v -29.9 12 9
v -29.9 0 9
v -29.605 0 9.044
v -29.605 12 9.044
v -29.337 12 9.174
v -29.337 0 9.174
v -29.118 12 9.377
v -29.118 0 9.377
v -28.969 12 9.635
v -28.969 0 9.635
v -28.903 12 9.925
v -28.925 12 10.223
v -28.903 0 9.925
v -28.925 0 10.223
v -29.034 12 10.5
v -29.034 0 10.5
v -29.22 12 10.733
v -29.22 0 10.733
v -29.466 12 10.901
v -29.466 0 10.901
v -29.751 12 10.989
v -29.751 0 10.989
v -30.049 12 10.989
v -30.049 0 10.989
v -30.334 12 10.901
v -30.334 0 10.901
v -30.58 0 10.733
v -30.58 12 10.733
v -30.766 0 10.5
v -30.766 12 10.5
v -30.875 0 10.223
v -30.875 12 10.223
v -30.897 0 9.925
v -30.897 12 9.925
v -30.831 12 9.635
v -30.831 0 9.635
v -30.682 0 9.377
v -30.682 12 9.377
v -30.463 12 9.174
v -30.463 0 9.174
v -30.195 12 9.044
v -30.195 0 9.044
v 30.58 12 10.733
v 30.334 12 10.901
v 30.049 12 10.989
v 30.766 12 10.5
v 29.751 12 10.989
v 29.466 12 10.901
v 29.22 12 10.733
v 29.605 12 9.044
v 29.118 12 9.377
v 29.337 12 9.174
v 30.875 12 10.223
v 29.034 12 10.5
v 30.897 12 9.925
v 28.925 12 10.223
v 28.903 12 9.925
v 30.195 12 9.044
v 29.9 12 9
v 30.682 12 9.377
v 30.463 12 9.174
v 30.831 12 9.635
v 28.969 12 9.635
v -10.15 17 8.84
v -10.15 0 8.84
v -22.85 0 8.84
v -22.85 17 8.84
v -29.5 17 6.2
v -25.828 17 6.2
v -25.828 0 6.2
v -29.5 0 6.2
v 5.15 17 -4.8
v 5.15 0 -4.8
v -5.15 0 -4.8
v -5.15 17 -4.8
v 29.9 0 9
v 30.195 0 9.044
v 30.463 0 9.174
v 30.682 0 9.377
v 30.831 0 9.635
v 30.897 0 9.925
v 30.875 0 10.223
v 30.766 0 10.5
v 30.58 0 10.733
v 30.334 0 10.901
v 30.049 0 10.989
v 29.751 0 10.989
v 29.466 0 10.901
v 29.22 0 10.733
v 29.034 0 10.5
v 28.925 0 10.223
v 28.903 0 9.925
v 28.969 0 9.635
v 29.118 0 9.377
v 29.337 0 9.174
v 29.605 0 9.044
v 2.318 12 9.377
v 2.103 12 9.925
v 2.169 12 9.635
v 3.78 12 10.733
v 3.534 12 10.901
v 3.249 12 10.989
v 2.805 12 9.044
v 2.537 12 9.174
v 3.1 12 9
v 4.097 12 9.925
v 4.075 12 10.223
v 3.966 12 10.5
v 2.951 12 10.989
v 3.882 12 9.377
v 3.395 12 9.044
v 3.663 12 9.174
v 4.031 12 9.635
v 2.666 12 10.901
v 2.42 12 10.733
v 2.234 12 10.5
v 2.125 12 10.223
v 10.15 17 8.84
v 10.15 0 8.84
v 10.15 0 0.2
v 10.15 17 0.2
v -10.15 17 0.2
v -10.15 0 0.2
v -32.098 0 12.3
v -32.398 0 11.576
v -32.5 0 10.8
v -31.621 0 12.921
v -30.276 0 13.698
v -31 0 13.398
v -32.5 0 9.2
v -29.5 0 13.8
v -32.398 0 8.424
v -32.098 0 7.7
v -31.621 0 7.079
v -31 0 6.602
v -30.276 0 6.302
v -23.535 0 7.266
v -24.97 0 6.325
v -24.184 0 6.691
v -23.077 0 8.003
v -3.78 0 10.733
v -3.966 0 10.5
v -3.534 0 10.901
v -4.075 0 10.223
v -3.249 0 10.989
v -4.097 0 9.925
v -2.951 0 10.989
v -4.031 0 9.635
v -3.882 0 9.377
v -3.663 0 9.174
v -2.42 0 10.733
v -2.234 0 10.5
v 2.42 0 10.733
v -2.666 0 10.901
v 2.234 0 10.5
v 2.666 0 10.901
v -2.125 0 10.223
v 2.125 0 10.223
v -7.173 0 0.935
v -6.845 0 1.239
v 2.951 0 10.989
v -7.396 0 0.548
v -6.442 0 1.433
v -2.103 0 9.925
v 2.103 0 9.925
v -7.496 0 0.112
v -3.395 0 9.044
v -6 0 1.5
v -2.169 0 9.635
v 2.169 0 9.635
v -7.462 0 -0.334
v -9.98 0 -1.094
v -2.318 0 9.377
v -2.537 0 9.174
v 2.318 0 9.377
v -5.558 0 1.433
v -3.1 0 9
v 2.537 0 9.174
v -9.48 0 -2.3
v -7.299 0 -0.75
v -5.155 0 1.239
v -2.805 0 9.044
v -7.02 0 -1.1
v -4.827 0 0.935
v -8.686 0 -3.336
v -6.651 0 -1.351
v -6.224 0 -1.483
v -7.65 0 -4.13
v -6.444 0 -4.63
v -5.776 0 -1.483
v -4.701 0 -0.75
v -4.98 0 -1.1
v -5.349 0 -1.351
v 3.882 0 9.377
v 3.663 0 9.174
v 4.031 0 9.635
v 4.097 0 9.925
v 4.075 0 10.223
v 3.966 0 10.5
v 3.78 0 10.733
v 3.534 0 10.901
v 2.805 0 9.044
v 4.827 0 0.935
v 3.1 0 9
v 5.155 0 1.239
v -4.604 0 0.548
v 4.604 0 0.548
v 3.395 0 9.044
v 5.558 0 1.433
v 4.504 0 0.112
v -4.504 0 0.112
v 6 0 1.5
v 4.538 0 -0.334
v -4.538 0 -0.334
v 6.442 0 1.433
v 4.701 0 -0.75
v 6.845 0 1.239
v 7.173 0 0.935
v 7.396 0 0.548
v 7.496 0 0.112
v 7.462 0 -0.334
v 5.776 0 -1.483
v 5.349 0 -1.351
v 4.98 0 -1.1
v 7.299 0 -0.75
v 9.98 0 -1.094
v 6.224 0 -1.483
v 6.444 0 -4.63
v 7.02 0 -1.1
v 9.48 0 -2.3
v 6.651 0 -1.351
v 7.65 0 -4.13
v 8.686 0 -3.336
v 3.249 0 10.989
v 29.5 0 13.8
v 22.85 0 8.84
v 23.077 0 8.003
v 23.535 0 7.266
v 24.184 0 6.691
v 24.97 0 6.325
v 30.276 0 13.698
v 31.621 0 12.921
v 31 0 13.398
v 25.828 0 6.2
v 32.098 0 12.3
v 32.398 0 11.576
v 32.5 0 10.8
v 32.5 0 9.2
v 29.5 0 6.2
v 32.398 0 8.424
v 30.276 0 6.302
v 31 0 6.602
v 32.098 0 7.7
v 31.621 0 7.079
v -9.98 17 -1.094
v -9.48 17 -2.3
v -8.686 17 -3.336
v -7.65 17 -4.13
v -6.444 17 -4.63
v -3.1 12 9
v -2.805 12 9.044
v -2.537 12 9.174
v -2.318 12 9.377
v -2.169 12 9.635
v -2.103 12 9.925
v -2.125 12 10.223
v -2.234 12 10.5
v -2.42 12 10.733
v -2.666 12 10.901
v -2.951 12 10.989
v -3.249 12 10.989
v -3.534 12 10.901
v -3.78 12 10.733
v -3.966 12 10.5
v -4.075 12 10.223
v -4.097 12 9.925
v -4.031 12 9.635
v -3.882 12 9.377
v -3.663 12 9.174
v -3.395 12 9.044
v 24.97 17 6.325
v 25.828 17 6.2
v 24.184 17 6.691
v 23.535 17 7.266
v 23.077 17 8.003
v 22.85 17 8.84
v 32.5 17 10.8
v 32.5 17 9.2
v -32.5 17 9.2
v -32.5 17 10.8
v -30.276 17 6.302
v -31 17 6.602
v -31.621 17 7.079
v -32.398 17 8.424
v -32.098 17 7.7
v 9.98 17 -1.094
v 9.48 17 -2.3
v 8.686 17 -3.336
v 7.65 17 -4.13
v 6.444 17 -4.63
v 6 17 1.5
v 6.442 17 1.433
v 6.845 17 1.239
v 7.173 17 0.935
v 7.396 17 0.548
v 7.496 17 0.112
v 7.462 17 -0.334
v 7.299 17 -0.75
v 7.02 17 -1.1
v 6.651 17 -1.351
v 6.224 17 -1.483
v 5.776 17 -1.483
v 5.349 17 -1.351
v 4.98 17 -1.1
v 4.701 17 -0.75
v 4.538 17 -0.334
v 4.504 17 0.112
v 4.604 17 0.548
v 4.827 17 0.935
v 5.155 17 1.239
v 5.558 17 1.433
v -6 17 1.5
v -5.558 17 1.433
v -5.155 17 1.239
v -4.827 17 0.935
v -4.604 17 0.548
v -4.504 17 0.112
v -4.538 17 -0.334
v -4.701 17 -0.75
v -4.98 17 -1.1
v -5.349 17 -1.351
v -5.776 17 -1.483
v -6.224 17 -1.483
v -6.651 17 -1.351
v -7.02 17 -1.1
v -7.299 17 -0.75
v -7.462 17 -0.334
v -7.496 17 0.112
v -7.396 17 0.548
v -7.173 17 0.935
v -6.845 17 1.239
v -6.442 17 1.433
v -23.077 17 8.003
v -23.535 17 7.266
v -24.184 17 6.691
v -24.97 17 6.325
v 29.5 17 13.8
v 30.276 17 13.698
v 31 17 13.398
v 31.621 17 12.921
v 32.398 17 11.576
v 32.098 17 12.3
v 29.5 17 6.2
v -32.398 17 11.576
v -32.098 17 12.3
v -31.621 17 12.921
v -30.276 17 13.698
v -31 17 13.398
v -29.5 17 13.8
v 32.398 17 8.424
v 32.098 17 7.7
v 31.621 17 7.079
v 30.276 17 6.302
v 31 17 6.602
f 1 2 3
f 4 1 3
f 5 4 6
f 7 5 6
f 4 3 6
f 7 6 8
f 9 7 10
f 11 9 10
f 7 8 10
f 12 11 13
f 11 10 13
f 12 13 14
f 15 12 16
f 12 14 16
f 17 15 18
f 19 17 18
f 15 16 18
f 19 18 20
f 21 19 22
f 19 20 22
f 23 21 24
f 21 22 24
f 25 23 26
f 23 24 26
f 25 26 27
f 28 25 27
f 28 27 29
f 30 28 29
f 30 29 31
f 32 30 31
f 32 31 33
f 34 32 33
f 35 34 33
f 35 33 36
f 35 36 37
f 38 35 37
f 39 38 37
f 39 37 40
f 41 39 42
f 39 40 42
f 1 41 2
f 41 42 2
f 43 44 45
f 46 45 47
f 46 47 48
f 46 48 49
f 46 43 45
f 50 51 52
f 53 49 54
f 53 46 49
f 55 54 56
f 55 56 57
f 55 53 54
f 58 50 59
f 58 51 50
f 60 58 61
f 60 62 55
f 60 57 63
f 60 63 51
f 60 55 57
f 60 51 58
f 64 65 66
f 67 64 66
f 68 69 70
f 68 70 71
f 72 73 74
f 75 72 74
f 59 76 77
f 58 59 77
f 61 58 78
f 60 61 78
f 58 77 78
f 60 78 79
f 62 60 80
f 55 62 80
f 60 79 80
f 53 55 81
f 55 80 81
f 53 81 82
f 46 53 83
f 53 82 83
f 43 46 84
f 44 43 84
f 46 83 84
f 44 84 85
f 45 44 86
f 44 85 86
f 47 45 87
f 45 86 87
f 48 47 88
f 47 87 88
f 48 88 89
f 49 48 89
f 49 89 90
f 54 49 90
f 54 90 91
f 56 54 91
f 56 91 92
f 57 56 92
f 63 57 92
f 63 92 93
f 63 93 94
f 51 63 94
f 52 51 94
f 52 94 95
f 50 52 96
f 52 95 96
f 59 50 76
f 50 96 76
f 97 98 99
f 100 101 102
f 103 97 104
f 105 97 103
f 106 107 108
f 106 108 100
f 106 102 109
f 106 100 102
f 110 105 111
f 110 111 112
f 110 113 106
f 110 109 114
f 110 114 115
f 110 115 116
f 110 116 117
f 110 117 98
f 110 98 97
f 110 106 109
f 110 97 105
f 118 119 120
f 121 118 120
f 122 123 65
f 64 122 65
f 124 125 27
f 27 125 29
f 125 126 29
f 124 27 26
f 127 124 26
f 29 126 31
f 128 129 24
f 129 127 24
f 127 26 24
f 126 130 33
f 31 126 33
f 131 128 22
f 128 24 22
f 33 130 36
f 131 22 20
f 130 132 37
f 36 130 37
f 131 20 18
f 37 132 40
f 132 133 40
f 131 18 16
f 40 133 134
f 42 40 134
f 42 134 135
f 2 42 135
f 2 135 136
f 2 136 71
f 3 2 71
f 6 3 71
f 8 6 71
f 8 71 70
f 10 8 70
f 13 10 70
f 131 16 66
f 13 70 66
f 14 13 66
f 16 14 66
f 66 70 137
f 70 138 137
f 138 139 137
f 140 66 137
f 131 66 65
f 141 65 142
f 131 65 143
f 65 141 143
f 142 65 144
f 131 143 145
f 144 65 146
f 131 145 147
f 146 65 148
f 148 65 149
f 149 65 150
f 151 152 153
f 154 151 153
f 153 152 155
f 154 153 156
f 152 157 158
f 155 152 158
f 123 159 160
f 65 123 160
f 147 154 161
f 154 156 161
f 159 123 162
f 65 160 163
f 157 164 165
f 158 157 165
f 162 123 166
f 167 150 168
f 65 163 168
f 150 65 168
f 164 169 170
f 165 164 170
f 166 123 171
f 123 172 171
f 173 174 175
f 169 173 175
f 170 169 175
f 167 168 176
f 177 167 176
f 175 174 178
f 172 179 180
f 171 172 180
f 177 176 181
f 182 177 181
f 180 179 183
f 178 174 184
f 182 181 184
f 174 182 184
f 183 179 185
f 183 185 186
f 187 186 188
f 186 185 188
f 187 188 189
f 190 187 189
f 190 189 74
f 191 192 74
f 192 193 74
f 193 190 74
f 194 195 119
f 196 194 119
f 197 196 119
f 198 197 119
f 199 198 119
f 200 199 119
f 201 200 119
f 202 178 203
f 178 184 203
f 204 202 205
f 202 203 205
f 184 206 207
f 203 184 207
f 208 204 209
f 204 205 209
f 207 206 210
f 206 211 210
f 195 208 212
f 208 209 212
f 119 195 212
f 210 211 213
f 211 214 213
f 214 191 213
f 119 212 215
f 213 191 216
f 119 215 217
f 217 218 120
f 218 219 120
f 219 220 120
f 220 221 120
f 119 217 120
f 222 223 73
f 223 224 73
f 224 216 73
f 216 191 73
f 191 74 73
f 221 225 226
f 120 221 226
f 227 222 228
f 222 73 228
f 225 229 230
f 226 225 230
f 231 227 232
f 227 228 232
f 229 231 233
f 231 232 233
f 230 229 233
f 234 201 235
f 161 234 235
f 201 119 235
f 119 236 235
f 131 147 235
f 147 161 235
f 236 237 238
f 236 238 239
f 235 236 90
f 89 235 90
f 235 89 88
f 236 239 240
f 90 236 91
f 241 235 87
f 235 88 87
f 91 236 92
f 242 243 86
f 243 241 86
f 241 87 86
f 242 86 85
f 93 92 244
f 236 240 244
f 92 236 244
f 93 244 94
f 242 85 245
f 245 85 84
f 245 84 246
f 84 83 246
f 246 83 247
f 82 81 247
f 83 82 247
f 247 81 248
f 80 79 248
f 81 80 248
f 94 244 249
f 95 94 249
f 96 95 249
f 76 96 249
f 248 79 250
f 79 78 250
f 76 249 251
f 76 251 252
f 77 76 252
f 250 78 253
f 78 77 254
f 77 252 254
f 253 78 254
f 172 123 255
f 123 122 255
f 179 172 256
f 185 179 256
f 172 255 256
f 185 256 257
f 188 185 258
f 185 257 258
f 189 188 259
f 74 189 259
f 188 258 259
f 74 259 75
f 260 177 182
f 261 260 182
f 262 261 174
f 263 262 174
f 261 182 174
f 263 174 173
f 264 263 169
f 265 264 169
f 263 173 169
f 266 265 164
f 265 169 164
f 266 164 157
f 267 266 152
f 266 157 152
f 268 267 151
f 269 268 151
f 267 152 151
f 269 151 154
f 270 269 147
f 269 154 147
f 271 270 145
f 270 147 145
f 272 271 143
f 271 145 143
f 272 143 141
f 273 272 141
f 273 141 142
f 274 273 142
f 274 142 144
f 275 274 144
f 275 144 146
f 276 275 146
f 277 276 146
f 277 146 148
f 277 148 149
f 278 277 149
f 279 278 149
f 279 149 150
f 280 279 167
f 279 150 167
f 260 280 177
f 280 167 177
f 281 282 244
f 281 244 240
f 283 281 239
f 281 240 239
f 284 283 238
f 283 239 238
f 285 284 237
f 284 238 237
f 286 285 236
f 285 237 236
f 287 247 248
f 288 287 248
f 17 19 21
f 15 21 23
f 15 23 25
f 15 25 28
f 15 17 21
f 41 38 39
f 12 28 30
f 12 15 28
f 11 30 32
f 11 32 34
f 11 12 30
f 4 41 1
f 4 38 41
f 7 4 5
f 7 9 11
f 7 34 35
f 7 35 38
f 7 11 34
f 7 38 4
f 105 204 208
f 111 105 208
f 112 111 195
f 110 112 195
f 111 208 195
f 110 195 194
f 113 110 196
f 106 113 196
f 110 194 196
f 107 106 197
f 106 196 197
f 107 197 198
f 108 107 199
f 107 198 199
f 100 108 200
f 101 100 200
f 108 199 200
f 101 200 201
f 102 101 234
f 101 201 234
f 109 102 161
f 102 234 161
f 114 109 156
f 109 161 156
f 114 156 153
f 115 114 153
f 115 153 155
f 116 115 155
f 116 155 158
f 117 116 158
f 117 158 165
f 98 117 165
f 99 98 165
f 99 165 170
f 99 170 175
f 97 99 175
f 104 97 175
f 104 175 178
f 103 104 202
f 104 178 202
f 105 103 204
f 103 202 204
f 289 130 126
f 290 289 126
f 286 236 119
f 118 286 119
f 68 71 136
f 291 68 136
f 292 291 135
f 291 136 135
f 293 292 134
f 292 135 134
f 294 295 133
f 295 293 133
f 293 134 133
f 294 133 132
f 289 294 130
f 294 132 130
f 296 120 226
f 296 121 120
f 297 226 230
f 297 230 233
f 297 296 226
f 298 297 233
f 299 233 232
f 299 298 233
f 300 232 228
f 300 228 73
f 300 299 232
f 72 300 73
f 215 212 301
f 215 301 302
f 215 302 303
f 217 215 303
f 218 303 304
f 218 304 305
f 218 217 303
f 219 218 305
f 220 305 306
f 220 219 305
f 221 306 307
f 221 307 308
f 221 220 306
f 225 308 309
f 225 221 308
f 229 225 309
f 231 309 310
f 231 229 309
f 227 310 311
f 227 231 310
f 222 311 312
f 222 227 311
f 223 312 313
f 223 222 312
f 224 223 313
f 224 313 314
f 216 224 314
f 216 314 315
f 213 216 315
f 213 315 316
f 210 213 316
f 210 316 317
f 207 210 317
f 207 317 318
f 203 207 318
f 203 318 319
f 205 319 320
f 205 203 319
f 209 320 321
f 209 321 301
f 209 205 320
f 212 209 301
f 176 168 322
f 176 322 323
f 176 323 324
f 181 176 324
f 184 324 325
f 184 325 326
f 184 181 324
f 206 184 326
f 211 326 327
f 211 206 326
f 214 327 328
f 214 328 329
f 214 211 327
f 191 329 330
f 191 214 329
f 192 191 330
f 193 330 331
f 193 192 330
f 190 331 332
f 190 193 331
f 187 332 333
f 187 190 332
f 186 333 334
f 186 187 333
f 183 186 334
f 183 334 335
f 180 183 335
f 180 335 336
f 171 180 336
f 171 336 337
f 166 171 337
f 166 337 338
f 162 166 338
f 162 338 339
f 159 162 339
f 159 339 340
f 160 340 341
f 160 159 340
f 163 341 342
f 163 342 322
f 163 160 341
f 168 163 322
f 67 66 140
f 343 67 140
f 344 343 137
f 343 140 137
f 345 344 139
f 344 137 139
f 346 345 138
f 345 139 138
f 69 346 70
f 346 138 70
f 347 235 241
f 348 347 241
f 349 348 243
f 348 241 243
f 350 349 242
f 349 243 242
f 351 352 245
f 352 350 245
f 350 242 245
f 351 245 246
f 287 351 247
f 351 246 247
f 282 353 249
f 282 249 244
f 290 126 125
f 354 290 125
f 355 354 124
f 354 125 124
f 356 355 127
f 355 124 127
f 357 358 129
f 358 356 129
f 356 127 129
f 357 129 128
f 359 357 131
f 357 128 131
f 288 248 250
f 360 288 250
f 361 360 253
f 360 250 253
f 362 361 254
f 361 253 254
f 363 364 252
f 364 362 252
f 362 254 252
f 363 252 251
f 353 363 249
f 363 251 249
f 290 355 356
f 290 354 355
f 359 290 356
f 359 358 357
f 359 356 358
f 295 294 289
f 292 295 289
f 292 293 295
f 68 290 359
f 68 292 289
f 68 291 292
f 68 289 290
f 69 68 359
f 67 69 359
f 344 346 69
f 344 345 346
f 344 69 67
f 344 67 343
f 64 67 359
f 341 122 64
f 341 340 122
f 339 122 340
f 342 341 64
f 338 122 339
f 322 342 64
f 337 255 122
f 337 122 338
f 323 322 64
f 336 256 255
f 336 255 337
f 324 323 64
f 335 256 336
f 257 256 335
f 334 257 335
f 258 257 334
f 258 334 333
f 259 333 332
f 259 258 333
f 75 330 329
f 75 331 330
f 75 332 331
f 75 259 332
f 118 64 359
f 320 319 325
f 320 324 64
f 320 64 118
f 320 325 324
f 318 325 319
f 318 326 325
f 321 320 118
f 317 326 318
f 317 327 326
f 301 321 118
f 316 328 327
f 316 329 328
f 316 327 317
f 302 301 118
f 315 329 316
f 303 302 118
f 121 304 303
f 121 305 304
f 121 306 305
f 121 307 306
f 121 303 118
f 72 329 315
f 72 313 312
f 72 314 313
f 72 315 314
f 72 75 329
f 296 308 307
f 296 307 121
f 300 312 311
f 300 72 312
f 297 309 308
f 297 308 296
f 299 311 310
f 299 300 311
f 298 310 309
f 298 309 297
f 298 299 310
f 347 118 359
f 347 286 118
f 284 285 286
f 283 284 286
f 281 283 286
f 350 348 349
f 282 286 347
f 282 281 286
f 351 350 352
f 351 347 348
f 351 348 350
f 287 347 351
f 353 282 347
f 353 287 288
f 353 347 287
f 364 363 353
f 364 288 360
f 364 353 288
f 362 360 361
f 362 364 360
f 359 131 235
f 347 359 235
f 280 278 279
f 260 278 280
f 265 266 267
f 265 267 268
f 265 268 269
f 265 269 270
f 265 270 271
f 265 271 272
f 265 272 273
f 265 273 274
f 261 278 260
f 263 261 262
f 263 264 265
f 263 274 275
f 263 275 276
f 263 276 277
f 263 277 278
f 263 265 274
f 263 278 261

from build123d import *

# Parameters (mm, degrees)
SKETCH1_R           = 1.5
BOSS_EXTRUDE1_DEPTH = 17
SKETCH2_R           = 1
CUT_EXTRUDE1_DEPTH  = 12
FILLET2_R           = 5
FILLET3_R           = 3


with BuildPart() as part:
    # Sketch1 → Boss-Extrude1 (new body)
    with BuildSketch(Plane(origin=(0, 0, 0), x_dir=(1, 0, 0), z_dir=(0, 1, 0))):
        Polygon((-32.5, -13.8), (32.5, -13.8), (32.5, -6.2), (22.85, -6.2), (22.85, -8.84), (10.15, -8.84), (10.15, -6.2), (10.15, 4.8), (-10.15, 4.8), (-10.15, -8.84), (-22.85, -8.84), (-22.85, -6.2), (-32.5, -6.2), align=None)
        with Locations(Location((-6, 0, 0), (0, 0, 270))):
            Circle(SKETCH1_R, mode=Mode.SUBTRACT)
        with Locations(Location((6, 0, 0), (0, 0, 270))):
            Circle(SKETCH1_R, mode=Mode.SUBTRACT)
    extrude(amount=BOSS_EXTRUDE1_DEPTH)

    # Sketch2 → Cut-Extrude1 (cut)
    with BuildSketch(Plane.XZ):
        with Locations(Location((-3.1, 10, 0), (0, 0, 270))):
            Circle(SKETCH2_R)
        with Locations(Location((-29.9, 10, 0), (0, 0, 270))):
            Circle(SKETCH2_R)
        with Locations(Location((3.1, 10, 0), (0, 0, 270))):
            Circle(SKETCH2_R)
        with Locations(Location((29.9, 10, 0), (0, 0, 270))):
            Circle(SKETCH2_R)
    extrude(amount=-CUT_EXTRUDE1_DEPTH, mode=Mode.SUBTRACT)

    # Fillet2
    fillet2_edges = [part.edges().sort_by_distance(p)[0] for p in [
        (-10.15, 8.5, -4.8),
        (10.15, 8.5, -4.8),
    ]]
    fillet(fillet2_edges, radius=FILLET2_R)

    # Fillet3
    # the kernel refuses this fillet: 3 mm, written as the material it takes off along each edge
    with BuildSketch(Plane(origin=(-32.5, -7.5, 13.8), x_dir=(0, 0, -1), z_dir=(0, 1, 0)), Plane(origin=(32.5, -7.5, 13.8), x_dir=(-1, 0, 0), z_dir=(0, 1, 0)), Plane(origin=(32.5, -7.5, 6.2), x_dir=(0, 0, 1), z_dir=(0, 1, 0)), Plane(origin=(-32.5, -7.5, 6.2), x_dir=(1, 0, 0), z_dir=(0, 1, 0))) as fillet3_piece_1:
        with BuildLine():
            CenterArc((FILLET3_R, -FILLET3_R), FILLET3_R, 90, 90)
            Line((0, -FILLET3_R), (-FILLET3_R * 0.02, -FILLET3_R))
            Line((-FILLET3_R * 0.02, -FILLET3_R), (-FILLET3_R * 0.02, FILLET3_R * 0.02))
            Line((-FILLET3_R * 0.02, FILLET3_R * 0.02), (FILLET3_R, FILLET3_R * 0.02))
            Line((FILLET3_R, FILLET3_R * 0.02), (FILLET3_R, 0))
        make_face()
    extrude(amount=32, mode=Mode.SUBTRACT)
    with BuildSketch(Plane(origin=(22.85, -7.445804188, 6.2), x_dir=(0, 0, 1), z_dir=(0, 1, 0))) as fillet3_piece_2:
        with BuildLine():
            CenterArc((3, 2.978321675), FILLET3_R, 180, 83.107897421)
            Line((0, 2.978321675), (-0.06, 2.978321675))
            Line((-0.06, 2.978321675), (-0.06, 0))
            Line((-0.06, 0), (0, -0.06))
            ThreePointArc((0, -0.06), (1.32, -0.06), (2.6328, -0.059566434))
            Line((2.6328, -0.059566434), (2.64, 0))
        make_face()
    extrude(amount=31.891608375, mode=Mode.SUBTRACT)
    with BuildSketch(Plane(origin=(-22.85, -7.445804188, 6.2), x_dir=(0, 0, 1), z_dir=(0, 1, 0))) as fillet3_piece_3:
        with BuildLine():
            CenterArc((3, -2.978321675), FILLET3_R, 96.892102579, 83.107897421)
            Line((0, -2.978321675), (-0.06, -2.978321675))
            Line((-0.06, -2.978321675), (-0.06, 0))
            Line((-0.06, 0), (0, 0.06))
            ThreePointArc((0, 0.06), (1.32, 0.06), (2.6328, 0.059566434))
            Line((2.6328, 0.059566434), (2.64, 0))
        make_face()
    extrude(amount=31.891608375, mode=Mode.SUBTRACT)


solid = part.part
